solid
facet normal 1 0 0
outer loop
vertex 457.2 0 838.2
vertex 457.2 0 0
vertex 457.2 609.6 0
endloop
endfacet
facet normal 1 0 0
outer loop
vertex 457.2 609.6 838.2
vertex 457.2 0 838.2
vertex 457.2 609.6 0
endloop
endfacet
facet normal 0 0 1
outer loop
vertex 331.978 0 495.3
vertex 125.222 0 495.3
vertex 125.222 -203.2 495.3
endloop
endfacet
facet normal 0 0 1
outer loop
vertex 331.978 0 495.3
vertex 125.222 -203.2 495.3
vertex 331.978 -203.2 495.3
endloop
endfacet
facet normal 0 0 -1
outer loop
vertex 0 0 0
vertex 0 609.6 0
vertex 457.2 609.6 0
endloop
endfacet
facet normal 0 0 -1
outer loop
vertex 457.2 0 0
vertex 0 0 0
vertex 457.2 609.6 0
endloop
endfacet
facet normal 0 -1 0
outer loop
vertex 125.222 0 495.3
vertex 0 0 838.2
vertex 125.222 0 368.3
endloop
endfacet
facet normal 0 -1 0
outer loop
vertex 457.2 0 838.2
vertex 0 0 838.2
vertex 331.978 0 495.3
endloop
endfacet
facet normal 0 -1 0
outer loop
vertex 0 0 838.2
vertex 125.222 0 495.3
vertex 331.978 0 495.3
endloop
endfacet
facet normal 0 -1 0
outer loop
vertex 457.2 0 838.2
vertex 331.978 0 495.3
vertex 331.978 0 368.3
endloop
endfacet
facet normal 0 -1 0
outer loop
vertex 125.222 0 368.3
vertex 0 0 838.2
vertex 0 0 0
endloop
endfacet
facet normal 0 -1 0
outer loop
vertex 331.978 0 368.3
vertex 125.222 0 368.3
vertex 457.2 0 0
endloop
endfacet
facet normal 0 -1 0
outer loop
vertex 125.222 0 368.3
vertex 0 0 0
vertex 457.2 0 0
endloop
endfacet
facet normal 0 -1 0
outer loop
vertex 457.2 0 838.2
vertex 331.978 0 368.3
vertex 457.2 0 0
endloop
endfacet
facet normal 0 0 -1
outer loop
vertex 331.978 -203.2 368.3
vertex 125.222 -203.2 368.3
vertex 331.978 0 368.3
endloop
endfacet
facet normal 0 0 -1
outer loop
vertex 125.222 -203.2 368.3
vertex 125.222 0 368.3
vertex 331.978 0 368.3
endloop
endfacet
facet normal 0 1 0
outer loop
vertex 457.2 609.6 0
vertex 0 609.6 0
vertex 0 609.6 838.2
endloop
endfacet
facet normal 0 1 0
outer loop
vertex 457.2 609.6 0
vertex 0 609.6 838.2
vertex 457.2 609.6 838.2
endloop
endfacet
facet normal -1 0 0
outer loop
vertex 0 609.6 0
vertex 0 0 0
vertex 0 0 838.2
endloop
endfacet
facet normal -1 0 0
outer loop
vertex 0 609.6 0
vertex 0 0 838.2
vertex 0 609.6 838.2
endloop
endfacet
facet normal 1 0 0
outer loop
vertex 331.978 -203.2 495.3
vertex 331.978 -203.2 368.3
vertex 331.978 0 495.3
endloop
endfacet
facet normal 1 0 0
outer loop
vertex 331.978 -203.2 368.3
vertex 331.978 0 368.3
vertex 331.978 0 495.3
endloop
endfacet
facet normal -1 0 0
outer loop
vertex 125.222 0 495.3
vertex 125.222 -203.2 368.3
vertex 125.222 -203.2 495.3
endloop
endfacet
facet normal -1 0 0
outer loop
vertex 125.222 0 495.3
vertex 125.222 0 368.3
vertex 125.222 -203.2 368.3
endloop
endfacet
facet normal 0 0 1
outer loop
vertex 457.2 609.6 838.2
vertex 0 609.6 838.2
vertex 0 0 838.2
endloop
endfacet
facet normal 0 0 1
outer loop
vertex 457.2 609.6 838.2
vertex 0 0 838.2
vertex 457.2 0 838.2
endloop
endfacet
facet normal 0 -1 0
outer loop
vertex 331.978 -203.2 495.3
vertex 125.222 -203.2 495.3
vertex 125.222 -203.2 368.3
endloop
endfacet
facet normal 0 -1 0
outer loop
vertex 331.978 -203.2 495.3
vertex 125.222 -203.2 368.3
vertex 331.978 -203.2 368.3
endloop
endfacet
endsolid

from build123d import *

# Parameters (mm, degrees)
F0_W      = 457.2
F0_H      = 609.6
F1_DEPTH  = 838.2
F2_W      = 206.756
F2_H      = 127
F3_DEPTH  = 25.4
F3_FACE_W = 206.756
F3_FACE_H = 127
F4_DEPTH  = 177.8


with BuildPart() as f1:
    # F0 (on Top) → F1 (new body)
    with BuildSketch(Plane.XY):
        with Locations((228.6, 304.8)):
            Rectangle(F0_W, F0_H)
    extrude(amount=F1_DEPTH)

    # F2 (on face) → F3 (join)
    with BuildSketch(Plane.XZ):
        with Locations((228.6, 431.8)):
            Rectangle(F2_W, F2_H)
    extrude(amount=F3_DEPTH)

    # F3_face (on face) → F4 (join)
    with BuildSketch(Plane(origin=(228.6, -25.4, 431.8), x_dir=(1, 0, 0), z_dir=(0, -1, 0))):
        Rectangle(F3_FACE_W, F3_FACE_H)
    extrude(amount=F4_DEPTH)


solid = f1.part
